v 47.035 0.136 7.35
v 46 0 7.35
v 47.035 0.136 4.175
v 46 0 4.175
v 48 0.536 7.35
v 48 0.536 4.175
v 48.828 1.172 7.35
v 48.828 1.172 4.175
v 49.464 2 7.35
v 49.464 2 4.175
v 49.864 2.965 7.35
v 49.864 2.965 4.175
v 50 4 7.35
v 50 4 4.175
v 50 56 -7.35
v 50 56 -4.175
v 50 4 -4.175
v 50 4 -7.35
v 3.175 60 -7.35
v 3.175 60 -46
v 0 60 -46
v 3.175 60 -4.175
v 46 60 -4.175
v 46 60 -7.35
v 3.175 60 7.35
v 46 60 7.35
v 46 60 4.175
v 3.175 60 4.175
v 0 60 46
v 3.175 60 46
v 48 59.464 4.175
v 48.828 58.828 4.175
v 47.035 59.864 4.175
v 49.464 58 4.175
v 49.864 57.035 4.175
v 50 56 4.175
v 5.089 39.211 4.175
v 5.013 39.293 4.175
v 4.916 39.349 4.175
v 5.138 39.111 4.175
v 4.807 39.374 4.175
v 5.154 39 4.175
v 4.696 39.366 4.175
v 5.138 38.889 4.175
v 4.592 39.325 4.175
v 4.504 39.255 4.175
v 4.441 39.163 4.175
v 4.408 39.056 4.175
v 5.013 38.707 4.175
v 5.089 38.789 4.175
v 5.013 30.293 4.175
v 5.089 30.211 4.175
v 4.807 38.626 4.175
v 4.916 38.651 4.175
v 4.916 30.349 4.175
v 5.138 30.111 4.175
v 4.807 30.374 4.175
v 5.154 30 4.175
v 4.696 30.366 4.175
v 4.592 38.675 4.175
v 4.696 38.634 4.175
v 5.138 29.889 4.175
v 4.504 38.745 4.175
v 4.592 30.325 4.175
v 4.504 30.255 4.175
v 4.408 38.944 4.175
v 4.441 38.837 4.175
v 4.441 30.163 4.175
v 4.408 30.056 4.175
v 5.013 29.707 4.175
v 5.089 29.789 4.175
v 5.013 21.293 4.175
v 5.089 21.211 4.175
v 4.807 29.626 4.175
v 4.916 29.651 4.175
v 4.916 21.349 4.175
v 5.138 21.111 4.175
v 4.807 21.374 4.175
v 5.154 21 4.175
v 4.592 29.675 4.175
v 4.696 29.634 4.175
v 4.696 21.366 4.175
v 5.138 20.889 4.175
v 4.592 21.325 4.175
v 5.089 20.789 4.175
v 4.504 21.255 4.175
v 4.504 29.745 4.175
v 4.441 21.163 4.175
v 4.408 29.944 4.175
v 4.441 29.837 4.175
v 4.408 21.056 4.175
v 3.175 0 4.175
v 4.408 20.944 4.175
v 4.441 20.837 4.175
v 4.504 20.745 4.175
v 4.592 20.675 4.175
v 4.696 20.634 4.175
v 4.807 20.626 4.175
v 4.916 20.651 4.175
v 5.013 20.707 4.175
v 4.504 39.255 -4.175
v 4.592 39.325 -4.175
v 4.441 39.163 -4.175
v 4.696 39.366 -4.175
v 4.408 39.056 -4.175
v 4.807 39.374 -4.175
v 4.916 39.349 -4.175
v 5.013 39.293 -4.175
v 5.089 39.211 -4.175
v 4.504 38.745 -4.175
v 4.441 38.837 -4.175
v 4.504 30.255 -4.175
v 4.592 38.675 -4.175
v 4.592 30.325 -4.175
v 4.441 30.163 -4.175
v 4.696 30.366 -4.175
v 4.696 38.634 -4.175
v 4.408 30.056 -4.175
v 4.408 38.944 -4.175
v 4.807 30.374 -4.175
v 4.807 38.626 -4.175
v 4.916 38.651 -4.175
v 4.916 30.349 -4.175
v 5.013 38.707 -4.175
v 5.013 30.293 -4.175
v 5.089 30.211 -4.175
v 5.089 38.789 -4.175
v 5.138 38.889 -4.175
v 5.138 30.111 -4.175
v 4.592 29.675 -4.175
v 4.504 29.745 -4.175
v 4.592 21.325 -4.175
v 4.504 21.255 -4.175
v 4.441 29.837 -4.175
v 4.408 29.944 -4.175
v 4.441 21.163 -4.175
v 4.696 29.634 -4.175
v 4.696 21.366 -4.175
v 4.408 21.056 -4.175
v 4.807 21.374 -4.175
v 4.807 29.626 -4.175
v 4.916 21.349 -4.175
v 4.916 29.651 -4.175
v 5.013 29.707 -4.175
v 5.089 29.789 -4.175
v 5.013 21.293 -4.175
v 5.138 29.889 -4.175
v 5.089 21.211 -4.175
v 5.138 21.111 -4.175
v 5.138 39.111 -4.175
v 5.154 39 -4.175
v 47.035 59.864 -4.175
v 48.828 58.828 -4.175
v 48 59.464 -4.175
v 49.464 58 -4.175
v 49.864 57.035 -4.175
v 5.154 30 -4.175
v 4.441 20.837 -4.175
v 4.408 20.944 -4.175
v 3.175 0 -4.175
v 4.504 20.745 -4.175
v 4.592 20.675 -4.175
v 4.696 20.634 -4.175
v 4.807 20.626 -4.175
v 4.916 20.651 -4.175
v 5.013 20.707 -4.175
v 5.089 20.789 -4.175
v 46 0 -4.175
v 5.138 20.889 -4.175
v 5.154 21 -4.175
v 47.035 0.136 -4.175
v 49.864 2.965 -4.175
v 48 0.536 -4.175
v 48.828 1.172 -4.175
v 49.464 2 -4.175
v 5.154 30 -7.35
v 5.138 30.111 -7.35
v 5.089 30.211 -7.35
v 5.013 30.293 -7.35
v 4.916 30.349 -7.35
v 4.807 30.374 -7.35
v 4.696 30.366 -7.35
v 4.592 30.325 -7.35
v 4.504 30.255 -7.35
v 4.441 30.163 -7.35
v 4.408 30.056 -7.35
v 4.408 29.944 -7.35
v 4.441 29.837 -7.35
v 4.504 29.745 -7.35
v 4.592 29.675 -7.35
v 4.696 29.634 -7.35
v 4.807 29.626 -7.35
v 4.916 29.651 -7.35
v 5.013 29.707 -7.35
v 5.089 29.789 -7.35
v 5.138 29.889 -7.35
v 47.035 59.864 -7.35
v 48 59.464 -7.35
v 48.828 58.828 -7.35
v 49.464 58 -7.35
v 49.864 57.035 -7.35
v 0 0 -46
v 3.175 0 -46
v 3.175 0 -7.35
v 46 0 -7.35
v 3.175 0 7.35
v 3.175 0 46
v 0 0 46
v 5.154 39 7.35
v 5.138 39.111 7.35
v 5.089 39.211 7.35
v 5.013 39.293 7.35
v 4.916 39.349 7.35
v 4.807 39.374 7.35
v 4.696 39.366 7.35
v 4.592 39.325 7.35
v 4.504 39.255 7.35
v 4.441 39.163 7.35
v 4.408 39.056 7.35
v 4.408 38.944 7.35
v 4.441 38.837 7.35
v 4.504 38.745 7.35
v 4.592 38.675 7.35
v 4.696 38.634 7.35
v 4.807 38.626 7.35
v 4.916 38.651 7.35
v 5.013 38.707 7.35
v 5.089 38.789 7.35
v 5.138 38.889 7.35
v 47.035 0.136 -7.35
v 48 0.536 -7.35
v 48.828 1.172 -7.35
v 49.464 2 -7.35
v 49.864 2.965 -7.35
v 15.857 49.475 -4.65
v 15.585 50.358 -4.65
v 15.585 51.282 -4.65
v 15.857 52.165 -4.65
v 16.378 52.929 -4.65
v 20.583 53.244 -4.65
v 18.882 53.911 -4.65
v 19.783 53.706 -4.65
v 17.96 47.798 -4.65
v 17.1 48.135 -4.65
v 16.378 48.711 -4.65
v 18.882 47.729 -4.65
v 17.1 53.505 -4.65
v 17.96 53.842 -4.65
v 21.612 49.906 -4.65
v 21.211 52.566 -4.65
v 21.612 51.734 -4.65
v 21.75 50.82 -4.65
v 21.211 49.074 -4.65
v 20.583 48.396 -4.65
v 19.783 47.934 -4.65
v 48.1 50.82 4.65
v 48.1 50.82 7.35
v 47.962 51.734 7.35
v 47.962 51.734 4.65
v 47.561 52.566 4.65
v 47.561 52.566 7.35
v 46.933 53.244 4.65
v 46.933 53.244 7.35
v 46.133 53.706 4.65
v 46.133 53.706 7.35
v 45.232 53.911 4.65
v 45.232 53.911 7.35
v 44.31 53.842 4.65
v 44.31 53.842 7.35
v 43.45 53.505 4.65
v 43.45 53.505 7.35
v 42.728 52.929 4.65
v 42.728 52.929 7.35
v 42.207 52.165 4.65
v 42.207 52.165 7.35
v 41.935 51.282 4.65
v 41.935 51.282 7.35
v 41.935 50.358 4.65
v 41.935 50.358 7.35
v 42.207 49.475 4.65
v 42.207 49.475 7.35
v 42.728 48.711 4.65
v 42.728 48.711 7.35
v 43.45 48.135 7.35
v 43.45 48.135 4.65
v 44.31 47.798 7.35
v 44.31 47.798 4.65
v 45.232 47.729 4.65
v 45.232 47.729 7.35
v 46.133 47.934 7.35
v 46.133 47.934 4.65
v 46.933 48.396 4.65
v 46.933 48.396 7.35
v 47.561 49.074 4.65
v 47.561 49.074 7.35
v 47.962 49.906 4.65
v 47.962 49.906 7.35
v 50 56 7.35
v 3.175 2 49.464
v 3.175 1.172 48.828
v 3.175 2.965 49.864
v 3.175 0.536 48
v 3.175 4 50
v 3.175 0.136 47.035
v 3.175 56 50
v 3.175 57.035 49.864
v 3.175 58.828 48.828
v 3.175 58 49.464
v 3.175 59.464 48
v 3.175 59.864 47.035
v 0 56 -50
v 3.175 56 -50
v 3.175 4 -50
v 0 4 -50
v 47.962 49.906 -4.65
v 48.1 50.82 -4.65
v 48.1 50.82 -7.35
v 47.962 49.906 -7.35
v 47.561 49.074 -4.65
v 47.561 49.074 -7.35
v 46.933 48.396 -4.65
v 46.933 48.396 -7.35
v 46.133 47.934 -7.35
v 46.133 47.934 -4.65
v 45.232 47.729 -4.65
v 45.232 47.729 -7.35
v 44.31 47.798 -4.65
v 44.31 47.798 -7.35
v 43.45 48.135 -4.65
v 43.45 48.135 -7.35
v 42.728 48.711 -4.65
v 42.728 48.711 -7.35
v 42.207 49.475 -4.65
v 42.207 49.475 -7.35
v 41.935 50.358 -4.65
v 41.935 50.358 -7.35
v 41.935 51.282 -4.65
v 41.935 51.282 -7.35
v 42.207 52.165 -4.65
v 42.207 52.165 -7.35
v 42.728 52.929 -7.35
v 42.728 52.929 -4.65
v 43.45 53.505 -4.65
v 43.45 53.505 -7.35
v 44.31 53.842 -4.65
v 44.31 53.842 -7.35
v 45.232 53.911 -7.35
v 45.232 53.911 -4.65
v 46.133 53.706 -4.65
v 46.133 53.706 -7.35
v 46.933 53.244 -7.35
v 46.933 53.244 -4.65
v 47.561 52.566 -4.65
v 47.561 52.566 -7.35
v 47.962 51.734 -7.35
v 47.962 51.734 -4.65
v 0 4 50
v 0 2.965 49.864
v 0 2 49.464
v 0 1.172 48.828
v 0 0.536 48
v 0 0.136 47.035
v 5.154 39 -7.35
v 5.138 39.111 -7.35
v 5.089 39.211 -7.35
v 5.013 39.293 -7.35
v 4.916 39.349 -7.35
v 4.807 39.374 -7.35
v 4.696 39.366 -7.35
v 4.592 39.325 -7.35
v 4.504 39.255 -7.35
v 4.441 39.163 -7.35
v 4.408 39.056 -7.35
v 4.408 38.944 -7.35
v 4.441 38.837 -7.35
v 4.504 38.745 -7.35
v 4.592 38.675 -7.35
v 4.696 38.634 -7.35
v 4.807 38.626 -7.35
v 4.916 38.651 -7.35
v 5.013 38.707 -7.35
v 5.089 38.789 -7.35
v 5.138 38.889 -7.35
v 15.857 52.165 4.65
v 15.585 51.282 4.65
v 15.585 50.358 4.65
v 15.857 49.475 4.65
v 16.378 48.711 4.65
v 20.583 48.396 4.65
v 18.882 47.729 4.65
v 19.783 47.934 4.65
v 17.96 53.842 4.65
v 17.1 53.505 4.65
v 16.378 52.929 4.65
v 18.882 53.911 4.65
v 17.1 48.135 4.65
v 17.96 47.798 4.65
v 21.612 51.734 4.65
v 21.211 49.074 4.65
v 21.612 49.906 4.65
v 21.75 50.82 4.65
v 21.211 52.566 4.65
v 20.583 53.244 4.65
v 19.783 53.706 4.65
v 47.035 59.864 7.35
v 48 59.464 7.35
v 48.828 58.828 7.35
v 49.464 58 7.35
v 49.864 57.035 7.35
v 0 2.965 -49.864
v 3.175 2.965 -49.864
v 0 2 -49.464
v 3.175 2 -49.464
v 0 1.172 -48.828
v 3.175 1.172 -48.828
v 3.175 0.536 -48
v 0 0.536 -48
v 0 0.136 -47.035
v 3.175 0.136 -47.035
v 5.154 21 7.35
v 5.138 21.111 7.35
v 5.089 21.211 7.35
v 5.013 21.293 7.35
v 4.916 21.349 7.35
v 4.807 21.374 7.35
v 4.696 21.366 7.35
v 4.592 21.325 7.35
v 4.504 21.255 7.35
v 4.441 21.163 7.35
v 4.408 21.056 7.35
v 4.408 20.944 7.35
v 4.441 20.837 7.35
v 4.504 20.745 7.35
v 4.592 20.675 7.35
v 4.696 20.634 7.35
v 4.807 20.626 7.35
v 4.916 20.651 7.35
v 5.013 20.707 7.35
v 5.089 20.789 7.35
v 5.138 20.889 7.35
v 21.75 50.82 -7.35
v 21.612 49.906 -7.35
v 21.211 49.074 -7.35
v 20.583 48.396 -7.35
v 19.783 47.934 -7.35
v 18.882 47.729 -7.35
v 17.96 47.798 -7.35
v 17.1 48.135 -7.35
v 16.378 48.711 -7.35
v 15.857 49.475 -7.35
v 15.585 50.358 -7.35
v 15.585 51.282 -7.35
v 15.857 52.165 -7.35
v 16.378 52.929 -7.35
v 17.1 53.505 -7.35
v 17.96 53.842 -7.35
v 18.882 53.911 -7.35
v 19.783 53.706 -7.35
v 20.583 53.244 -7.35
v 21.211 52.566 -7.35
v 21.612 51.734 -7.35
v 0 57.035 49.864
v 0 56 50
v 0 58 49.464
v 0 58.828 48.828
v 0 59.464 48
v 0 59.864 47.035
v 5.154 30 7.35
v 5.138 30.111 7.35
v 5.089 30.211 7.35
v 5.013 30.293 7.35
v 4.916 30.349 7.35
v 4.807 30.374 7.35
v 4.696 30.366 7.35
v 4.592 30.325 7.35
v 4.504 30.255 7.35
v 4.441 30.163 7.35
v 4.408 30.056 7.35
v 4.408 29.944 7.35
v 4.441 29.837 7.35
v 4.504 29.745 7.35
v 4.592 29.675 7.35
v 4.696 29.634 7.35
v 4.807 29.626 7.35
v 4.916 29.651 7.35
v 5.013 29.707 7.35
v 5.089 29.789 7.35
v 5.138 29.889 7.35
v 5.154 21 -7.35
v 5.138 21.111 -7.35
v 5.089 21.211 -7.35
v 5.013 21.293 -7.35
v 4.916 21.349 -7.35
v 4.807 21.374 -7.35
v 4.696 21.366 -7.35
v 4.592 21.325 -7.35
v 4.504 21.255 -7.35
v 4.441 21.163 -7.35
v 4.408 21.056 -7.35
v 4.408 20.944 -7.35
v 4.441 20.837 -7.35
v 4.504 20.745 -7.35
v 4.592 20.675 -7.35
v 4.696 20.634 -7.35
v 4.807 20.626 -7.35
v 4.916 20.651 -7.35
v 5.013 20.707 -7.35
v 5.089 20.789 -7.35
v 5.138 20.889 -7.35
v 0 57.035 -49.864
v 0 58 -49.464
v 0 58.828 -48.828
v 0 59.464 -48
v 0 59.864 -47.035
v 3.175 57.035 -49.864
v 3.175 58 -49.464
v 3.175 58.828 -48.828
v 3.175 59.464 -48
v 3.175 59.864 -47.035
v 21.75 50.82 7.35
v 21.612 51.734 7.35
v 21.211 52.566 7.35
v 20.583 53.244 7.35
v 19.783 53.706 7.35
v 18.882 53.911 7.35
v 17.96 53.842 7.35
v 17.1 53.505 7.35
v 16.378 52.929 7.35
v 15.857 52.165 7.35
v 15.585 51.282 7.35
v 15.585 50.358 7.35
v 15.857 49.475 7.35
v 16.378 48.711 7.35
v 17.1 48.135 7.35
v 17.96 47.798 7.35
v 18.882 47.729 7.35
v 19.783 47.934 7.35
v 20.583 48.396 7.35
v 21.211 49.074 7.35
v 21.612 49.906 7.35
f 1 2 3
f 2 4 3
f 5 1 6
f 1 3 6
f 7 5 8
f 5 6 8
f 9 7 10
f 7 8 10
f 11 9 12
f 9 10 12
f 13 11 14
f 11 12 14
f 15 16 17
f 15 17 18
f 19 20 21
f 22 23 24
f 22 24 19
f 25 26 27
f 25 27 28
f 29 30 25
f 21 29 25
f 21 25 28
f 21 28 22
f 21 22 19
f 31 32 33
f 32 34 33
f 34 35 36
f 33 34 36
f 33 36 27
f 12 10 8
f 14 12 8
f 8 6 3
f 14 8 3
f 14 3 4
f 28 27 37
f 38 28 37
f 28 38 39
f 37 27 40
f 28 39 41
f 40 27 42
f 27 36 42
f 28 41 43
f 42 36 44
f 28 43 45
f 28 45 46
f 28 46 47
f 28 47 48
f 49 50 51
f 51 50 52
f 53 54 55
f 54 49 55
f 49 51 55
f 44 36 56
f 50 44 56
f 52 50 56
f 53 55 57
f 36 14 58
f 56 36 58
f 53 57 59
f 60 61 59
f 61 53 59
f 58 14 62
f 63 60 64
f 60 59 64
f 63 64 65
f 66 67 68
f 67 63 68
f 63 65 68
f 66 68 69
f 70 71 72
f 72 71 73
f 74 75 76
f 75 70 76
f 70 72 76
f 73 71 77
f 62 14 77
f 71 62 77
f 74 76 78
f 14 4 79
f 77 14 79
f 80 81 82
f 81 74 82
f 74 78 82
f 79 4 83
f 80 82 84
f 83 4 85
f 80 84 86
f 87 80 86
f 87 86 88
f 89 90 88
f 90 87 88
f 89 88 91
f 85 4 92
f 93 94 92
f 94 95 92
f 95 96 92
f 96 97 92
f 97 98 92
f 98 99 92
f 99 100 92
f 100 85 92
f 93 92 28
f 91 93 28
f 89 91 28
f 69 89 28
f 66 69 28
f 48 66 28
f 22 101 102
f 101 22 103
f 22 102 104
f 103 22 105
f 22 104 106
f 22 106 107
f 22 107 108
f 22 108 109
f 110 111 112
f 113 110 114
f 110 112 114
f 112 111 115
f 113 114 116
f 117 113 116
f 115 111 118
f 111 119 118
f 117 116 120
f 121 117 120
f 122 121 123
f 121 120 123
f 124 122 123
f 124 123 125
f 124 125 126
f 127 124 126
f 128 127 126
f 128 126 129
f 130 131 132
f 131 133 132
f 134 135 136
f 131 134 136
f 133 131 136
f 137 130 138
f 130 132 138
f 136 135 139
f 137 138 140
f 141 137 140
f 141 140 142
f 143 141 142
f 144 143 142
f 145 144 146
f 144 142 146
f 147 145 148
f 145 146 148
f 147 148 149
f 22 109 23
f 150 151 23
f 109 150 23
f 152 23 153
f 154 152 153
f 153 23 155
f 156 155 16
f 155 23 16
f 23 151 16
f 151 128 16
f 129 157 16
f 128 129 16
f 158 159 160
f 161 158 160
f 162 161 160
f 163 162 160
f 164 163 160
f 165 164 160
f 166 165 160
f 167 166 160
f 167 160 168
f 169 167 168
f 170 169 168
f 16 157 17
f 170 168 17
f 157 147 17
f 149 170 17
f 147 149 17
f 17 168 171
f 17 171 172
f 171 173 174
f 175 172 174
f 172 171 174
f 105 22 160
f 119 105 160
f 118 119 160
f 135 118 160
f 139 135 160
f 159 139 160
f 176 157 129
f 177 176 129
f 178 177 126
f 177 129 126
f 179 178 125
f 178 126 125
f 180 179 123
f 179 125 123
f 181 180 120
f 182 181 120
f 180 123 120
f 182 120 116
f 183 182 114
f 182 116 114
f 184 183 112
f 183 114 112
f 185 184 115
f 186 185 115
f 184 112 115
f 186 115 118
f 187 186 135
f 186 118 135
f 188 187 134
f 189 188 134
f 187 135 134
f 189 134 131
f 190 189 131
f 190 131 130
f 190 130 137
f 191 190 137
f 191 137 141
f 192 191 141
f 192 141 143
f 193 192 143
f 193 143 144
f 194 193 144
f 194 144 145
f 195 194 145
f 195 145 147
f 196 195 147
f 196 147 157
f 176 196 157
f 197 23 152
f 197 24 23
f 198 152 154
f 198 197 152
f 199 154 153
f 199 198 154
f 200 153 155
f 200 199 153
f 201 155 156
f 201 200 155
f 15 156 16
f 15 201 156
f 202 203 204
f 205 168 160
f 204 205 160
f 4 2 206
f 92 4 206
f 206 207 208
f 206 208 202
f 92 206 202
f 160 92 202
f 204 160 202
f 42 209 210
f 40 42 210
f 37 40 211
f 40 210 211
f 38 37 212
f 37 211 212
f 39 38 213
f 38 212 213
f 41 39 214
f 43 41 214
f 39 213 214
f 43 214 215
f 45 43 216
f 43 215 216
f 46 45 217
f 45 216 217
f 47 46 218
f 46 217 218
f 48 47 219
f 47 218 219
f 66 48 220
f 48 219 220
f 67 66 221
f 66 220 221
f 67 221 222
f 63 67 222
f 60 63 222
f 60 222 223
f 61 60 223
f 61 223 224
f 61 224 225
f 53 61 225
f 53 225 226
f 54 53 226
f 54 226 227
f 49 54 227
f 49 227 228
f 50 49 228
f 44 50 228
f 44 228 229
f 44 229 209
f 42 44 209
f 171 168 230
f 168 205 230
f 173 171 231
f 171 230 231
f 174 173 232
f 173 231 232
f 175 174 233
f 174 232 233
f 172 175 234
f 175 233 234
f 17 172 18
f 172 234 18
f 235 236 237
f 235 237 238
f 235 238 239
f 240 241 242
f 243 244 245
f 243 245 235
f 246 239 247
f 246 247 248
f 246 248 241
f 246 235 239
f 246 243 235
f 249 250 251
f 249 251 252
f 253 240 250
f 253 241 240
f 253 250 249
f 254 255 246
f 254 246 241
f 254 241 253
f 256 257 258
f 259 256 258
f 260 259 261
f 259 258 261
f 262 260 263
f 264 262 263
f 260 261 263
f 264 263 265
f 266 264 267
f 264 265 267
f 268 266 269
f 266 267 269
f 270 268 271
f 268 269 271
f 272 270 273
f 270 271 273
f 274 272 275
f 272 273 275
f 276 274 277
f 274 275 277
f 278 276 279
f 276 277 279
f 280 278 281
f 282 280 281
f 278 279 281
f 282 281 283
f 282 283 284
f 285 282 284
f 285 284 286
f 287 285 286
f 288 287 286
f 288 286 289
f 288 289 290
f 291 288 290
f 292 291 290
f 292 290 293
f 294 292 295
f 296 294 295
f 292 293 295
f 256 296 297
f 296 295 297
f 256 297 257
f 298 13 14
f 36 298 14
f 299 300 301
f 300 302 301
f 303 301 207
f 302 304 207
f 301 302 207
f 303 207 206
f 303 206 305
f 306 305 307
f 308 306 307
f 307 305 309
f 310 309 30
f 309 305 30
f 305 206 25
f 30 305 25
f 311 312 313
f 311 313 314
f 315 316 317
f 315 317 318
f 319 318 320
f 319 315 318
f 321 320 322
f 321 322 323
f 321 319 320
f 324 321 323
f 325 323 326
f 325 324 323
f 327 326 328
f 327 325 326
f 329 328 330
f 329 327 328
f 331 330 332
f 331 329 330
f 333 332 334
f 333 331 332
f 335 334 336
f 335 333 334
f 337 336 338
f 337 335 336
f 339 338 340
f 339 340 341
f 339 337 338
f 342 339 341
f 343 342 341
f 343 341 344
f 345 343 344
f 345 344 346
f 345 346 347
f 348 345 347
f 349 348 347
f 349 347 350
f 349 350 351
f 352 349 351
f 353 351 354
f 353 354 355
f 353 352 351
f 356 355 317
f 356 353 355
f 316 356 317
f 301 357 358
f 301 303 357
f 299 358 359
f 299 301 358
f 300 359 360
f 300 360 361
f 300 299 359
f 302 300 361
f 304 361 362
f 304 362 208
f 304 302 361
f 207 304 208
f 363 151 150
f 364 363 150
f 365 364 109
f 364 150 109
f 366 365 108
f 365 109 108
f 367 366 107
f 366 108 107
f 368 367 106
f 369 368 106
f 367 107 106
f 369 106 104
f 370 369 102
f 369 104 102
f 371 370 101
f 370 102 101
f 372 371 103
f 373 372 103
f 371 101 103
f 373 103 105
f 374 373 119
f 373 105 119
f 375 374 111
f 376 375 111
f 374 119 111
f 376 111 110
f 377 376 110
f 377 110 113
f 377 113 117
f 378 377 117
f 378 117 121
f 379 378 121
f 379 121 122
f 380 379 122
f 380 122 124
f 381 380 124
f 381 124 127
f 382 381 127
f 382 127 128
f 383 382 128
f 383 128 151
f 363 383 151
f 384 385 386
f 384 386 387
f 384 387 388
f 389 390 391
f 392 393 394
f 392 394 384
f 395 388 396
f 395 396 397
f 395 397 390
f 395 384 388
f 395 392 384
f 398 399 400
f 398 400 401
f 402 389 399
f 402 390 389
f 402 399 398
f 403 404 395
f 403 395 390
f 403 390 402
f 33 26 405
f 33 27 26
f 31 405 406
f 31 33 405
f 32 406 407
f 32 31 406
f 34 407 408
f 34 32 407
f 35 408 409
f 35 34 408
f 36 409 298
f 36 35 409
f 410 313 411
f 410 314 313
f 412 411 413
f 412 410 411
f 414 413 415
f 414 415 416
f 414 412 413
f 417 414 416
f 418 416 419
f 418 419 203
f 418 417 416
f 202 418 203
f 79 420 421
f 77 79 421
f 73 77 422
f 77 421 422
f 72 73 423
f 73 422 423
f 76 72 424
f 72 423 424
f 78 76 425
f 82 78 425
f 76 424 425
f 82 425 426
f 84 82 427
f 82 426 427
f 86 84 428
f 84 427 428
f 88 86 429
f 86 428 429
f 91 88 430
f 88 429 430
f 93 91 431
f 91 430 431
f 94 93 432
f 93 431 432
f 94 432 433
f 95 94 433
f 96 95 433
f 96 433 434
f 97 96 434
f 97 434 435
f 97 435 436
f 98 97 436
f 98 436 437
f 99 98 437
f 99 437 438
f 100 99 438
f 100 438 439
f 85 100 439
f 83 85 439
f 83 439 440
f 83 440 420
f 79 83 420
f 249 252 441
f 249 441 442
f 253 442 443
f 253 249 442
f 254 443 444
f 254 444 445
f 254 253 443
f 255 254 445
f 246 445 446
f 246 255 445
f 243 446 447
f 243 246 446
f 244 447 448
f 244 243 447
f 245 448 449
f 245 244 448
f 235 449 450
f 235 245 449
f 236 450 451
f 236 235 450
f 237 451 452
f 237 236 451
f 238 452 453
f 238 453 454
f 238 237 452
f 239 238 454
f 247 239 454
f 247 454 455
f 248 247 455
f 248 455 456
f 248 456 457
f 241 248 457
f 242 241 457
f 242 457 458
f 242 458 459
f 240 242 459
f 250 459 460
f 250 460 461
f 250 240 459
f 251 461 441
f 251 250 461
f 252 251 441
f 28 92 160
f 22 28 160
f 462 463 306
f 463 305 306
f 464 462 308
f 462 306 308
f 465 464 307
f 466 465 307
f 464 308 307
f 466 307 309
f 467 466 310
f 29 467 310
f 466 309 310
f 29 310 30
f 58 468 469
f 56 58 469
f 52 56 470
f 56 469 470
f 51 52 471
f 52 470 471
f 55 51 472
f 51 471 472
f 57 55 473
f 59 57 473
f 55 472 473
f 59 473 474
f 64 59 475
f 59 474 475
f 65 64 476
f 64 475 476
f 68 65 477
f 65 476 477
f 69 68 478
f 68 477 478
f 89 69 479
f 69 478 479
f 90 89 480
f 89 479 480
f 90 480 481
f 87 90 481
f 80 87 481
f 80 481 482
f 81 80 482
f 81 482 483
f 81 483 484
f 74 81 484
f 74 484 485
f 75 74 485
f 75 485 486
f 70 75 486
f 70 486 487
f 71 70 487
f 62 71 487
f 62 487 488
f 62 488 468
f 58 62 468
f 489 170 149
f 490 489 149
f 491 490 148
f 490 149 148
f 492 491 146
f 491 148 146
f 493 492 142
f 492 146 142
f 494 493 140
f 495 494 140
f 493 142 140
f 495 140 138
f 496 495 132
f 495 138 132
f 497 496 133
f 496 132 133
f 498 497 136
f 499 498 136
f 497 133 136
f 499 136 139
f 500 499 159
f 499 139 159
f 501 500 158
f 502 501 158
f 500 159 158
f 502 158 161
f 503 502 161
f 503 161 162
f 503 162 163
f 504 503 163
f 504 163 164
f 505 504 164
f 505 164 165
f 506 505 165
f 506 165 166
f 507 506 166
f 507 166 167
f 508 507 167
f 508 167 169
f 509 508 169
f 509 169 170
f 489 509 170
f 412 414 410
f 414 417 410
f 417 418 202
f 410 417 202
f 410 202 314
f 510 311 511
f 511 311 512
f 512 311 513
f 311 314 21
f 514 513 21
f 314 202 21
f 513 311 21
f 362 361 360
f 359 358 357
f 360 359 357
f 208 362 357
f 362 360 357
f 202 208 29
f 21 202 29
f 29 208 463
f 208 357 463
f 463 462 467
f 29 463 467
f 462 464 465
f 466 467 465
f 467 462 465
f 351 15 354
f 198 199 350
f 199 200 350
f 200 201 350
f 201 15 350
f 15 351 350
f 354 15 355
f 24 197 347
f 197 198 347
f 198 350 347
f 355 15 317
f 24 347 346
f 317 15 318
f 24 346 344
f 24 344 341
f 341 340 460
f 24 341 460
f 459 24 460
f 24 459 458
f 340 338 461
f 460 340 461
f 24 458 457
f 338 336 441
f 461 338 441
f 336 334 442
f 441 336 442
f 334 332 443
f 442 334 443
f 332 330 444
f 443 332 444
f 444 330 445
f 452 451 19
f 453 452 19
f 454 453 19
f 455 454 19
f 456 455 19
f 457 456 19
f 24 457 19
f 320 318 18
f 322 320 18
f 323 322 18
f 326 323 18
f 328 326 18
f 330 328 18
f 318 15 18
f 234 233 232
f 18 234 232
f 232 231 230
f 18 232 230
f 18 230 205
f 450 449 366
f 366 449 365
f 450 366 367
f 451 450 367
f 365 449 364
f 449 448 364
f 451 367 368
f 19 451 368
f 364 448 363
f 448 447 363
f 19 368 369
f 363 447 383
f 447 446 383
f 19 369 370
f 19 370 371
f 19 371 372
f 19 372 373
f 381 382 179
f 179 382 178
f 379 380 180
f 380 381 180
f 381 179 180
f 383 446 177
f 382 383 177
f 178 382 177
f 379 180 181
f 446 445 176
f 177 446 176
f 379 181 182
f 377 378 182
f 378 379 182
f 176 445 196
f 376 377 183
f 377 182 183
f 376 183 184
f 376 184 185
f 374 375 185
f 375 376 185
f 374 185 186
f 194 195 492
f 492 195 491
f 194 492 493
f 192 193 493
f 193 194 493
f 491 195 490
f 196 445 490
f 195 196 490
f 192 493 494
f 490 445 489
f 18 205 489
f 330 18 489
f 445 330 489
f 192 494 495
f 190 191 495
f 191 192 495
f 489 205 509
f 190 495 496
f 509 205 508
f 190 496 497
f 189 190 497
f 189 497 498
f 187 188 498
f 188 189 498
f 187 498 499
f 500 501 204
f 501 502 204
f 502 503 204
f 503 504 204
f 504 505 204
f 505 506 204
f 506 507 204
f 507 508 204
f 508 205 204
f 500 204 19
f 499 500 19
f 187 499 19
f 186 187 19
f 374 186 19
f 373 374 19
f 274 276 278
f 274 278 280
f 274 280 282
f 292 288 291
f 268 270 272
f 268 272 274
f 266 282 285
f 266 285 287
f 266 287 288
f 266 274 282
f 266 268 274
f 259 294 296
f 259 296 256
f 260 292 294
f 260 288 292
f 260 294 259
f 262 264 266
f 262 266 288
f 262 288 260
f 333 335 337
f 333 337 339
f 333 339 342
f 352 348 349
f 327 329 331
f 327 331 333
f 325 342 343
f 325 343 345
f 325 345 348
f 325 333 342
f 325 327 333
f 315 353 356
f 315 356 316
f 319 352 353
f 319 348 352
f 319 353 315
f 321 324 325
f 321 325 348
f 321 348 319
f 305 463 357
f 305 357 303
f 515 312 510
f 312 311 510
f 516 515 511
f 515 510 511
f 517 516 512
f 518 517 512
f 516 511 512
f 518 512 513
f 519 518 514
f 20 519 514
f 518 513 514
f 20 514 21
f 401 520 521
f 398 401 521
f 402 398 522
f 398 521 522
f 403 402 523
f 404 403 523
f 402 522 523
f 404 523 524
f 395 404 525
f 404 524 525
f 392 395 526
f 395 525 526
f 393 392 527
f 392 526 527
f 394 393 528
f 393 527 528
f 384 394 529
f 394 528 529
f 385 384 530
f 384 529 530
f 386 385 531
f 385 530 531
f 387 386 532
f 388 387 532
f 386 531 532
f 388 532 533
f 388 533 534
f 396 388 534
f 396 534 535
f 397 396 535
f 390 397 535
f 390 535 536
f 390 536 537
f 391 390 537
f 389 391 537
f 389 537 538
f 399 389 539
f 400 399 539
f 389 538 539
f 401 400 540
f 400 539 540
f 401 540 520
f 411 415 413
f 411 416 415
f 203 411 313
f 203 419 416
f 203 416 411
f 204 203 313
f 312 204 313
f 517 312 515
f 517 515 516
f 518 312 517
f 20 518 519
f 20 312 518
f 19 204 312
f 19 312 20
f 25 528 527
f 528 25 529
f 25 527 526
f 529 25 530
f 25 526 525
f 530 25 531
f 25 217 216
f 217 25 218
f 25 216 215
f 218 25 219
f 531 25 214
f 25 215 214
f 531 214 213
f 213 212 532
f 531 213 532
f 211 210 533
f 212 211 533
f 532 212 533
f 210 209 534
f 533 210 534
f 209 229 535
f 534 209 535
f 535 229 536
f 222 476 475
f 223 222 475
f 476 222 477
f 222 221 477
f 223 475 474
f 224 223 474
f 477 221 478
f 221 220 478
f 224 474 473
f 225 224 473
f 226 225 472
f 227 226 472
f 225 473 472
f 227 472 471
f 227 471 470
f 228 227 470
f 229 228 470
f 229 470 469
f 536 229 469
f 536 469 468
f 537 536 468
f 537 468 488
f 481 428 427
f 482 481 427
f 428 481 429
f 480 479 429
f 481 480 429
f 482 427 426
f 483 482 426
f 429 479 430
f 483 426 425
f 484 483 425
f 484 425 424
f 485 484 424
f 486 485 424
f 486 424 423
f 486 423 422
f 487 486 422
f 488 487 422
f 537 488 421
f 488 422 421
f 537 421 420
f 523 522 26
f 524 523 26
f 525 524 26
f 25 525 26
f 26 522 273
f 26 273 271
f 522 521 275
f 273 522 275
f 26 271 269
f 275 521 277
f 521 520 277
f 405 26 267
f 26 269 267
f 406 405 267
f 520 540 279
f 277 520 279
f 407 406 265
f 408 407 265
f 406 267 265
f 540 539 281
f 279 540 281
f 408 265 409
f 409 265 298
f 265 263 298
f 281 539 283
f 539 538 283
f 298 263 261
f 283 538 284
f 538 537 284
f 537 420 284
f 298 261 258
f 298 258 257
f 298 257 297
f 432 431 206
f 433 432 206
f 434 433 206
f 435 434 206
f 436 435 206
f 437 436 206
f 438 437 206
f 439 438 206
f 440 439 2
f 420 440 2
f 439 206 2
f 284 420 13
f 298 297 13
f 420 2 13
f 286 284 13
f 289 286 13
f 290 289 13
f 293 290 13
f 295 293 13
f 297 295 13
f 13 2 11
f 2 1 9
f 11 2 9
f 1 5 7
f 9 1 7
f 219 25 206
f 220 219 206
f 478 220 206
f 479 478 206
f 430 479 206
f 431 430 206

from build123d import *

# Parameters (mm, degrees)
BOSS_EXTRUDE1_DEPTH = 60
SKETCH3_R           = 3.1
CUT_EXTRUDE1_DEPTH  = 2.7
CUT_EXTRUDE2_START  = -2.7
SKETCH4_R           = 3.1
CUT_EXTRUDE2_DEPTH  = 2.7
FILLET1_R           = 4
CUT_EXTRUDE3_REACH  = 81.474
SKETCH5_R           = 0.375
SKETCH6_W           = 3.175
SKETCH6_H           = 60
BOSS_EXTRUDE2_DEPTH = 42.65
SKETCH7_W           = 3.175
SKETCH7_H           = 60
BOSS_EXTRUDE3_DEPTH = 42.65
FILLET2_R           = 4


with BuildPart() as part:
    # Sketch1 → Boss-Extrude1 (new body)
    with BuildSketch(Plane(origin=(0, 0, 0), x_dir=(1, 0, 0), z_dir=(0, 1, 0))):
        Polygon((0, 7.35), (0, -7.35), (50, -7.35), (50, -4.175), (3.175, -4.175), (3.175, 4.175), (50, 4.175), (50, 7.35), align=None)
    extrude(amount=BOSS_EXTRUDE1_DEPTH)

    # Sketch3 → Cut-Extrude1 (cut)
    with BuildSketch(Plane.XY.offset(7.35)):
        with Locations((45, 50.82)):
            Circle(SKETCH3_R)
        with Locations((18.65, 50.82)):
            Circle(SKETCH3_R)
    extrude(amount=-CUT_EXTRUDE1_DEPTH, mode=Mode.SUBTRACT)

    # Sketch4 → Cut-Extrude2 (cut)
    with BuildSketch(Plane(origin=(0, 0, -7.35), x_dir=(-1, 0, 0), z_dir=(0, 0, -1)).offset(CUT_EXTRUDE2_START)):
        with Locations(Location((-45, 50.82, 0), (0, 0, 180))):
            Circle(SKETCH4_R)
        with Locations(Location((-18.65, 50.82, 0), (0, 0, 180))):
            Circle(SKETCH4_R)
    extrude(amount=CUT_EXTRUDE2_DEPTH, mode=Mode.SUBTRACT)

    # Fillet1
    fillet1_edges = [part.edges().sort_by_distance(p)[0] for p in [
        (50, 0, 5.7625),
        (50, 60, -5.7625),
        (50, 60, 5.7625),
        (50, 0, -5.7625),
    ]]
    fillet(fillet1_edges, radius=FILLET1_R)

    # Cut-Extrude3: up to this face of the body (flat: up to its plane)
    cut_extrude3_end = Plane(part.part.faces().sort_by_distance((24.80303516, 29.571344164, -7.35))[0])
    # Sketch5 → Cut-Extrude3 (cut, up to the picked face)
    with BuildSketch(Plane.XY.offset(7.35), mode=Mode.PRIVATE) as cut_extrude3_sk1:
        with Locations((4.779169586, 21)):
            Circle(SKETCH5_R)
    cut_extrude3_tool1 = split(extrude(cut_extrude3_sk1.sketch, amount=-CUT_EXTRUDE3_REACH, mode=Mode.PRIVATE), bisect_by=cut_extrude3_end, keep=Keep.BOTH, mode=Mode.PRIVATE)
    # Sketch5 → Cut-Extrude3 (cut, up to the picked face)
    with BuildSketch(Plane.XY.offset(7.35), mode=Mode.PRIVATE) as cut_extrude3_sk2:
        with Locations((4.779169586, 39)):
            Circle(SKETCH5_R)
    cut_extrude3_tool2 = split(extrude(cut_extrude3_sk2.sketch, amount=-CUT_EXTRUDE3_REACH, mode=Mode.PRIVATE), bisect_by=cut_extrude3_end, keep=Keep.BOTH, mode=Mode.PRIVATE)
    # Sketch5 → Cut-Extrude3 (cut, up to the picked face)
    with BuildSketch(Plane.XY.offset(7.35), mode=Mode.PRIVATE) as cut_extrude3_sk3:
        with Locations((4.779169586, 30)):
            Circle(SKETCH5_R)
    cut_extrude3_tool3 = split(extrude(cut_extrude3_sk3.sketch, amount=-CUT_EXTRUDE3_REACH, mode=Mode.PRIVATE), bisect_by=cut_extrude3_end, keep=Keep.BOTH, mode=Mode.PRIVATE)
    add(cut_extrude3_tool1.solids().sort_by(Axis((4.77917, 21, 7.35), (0, 0, -1)))[0], mode=Mode.SUBTRACT)
    add(cut_extrude3_tool2.solids().sort_by(Axis((4.77917, 39, 7.35), (0, 0, -1)))[0], mode=Mode.SUBTRACT)
    add(cut_extrude3_tool3.solids().sort_by(Axis((4.77917, 30, 7.35), (0, 0, -1)))[0], mode=Mode.SUBTRACT)

    # Sketch6 → Boss-Extrude2 (add)
    with BuildSketch(Plane.XY.offset(7.35)):
        with Locations((1.5875, 30)):
            Rectangle(SKETCH6_W, SKETCH6_H)
    extrude(amount=BOSS_EXTRUDE2_DEPTH)

    # Sketch7 → Boss-Extrude3 (add)
    with BuildSketch(Plane(origin=(0, 0, -7.35), x_dir=(-1, 0, 0), z_dir=(0, 0, -1))):
        with Locations((-1.5875, 30)):
            Rectangle(SKETCH7_W, SKETCH7_H)
    extrude(amount=BOSS_EXTRUDE3_DEPTH)

    # Fillet2
    fillet2_edges = [part.edges().sort_by_distance(p)[0] for p in [
        (1.5875, 60, -50),
        (1.5875, 0, -50),
        (1.5875, 0, 50),
        (1.5875, 60, 50),
    ]]
    fillet(fillet2_edges, radius=FILLET2_R)


solid = part.part
